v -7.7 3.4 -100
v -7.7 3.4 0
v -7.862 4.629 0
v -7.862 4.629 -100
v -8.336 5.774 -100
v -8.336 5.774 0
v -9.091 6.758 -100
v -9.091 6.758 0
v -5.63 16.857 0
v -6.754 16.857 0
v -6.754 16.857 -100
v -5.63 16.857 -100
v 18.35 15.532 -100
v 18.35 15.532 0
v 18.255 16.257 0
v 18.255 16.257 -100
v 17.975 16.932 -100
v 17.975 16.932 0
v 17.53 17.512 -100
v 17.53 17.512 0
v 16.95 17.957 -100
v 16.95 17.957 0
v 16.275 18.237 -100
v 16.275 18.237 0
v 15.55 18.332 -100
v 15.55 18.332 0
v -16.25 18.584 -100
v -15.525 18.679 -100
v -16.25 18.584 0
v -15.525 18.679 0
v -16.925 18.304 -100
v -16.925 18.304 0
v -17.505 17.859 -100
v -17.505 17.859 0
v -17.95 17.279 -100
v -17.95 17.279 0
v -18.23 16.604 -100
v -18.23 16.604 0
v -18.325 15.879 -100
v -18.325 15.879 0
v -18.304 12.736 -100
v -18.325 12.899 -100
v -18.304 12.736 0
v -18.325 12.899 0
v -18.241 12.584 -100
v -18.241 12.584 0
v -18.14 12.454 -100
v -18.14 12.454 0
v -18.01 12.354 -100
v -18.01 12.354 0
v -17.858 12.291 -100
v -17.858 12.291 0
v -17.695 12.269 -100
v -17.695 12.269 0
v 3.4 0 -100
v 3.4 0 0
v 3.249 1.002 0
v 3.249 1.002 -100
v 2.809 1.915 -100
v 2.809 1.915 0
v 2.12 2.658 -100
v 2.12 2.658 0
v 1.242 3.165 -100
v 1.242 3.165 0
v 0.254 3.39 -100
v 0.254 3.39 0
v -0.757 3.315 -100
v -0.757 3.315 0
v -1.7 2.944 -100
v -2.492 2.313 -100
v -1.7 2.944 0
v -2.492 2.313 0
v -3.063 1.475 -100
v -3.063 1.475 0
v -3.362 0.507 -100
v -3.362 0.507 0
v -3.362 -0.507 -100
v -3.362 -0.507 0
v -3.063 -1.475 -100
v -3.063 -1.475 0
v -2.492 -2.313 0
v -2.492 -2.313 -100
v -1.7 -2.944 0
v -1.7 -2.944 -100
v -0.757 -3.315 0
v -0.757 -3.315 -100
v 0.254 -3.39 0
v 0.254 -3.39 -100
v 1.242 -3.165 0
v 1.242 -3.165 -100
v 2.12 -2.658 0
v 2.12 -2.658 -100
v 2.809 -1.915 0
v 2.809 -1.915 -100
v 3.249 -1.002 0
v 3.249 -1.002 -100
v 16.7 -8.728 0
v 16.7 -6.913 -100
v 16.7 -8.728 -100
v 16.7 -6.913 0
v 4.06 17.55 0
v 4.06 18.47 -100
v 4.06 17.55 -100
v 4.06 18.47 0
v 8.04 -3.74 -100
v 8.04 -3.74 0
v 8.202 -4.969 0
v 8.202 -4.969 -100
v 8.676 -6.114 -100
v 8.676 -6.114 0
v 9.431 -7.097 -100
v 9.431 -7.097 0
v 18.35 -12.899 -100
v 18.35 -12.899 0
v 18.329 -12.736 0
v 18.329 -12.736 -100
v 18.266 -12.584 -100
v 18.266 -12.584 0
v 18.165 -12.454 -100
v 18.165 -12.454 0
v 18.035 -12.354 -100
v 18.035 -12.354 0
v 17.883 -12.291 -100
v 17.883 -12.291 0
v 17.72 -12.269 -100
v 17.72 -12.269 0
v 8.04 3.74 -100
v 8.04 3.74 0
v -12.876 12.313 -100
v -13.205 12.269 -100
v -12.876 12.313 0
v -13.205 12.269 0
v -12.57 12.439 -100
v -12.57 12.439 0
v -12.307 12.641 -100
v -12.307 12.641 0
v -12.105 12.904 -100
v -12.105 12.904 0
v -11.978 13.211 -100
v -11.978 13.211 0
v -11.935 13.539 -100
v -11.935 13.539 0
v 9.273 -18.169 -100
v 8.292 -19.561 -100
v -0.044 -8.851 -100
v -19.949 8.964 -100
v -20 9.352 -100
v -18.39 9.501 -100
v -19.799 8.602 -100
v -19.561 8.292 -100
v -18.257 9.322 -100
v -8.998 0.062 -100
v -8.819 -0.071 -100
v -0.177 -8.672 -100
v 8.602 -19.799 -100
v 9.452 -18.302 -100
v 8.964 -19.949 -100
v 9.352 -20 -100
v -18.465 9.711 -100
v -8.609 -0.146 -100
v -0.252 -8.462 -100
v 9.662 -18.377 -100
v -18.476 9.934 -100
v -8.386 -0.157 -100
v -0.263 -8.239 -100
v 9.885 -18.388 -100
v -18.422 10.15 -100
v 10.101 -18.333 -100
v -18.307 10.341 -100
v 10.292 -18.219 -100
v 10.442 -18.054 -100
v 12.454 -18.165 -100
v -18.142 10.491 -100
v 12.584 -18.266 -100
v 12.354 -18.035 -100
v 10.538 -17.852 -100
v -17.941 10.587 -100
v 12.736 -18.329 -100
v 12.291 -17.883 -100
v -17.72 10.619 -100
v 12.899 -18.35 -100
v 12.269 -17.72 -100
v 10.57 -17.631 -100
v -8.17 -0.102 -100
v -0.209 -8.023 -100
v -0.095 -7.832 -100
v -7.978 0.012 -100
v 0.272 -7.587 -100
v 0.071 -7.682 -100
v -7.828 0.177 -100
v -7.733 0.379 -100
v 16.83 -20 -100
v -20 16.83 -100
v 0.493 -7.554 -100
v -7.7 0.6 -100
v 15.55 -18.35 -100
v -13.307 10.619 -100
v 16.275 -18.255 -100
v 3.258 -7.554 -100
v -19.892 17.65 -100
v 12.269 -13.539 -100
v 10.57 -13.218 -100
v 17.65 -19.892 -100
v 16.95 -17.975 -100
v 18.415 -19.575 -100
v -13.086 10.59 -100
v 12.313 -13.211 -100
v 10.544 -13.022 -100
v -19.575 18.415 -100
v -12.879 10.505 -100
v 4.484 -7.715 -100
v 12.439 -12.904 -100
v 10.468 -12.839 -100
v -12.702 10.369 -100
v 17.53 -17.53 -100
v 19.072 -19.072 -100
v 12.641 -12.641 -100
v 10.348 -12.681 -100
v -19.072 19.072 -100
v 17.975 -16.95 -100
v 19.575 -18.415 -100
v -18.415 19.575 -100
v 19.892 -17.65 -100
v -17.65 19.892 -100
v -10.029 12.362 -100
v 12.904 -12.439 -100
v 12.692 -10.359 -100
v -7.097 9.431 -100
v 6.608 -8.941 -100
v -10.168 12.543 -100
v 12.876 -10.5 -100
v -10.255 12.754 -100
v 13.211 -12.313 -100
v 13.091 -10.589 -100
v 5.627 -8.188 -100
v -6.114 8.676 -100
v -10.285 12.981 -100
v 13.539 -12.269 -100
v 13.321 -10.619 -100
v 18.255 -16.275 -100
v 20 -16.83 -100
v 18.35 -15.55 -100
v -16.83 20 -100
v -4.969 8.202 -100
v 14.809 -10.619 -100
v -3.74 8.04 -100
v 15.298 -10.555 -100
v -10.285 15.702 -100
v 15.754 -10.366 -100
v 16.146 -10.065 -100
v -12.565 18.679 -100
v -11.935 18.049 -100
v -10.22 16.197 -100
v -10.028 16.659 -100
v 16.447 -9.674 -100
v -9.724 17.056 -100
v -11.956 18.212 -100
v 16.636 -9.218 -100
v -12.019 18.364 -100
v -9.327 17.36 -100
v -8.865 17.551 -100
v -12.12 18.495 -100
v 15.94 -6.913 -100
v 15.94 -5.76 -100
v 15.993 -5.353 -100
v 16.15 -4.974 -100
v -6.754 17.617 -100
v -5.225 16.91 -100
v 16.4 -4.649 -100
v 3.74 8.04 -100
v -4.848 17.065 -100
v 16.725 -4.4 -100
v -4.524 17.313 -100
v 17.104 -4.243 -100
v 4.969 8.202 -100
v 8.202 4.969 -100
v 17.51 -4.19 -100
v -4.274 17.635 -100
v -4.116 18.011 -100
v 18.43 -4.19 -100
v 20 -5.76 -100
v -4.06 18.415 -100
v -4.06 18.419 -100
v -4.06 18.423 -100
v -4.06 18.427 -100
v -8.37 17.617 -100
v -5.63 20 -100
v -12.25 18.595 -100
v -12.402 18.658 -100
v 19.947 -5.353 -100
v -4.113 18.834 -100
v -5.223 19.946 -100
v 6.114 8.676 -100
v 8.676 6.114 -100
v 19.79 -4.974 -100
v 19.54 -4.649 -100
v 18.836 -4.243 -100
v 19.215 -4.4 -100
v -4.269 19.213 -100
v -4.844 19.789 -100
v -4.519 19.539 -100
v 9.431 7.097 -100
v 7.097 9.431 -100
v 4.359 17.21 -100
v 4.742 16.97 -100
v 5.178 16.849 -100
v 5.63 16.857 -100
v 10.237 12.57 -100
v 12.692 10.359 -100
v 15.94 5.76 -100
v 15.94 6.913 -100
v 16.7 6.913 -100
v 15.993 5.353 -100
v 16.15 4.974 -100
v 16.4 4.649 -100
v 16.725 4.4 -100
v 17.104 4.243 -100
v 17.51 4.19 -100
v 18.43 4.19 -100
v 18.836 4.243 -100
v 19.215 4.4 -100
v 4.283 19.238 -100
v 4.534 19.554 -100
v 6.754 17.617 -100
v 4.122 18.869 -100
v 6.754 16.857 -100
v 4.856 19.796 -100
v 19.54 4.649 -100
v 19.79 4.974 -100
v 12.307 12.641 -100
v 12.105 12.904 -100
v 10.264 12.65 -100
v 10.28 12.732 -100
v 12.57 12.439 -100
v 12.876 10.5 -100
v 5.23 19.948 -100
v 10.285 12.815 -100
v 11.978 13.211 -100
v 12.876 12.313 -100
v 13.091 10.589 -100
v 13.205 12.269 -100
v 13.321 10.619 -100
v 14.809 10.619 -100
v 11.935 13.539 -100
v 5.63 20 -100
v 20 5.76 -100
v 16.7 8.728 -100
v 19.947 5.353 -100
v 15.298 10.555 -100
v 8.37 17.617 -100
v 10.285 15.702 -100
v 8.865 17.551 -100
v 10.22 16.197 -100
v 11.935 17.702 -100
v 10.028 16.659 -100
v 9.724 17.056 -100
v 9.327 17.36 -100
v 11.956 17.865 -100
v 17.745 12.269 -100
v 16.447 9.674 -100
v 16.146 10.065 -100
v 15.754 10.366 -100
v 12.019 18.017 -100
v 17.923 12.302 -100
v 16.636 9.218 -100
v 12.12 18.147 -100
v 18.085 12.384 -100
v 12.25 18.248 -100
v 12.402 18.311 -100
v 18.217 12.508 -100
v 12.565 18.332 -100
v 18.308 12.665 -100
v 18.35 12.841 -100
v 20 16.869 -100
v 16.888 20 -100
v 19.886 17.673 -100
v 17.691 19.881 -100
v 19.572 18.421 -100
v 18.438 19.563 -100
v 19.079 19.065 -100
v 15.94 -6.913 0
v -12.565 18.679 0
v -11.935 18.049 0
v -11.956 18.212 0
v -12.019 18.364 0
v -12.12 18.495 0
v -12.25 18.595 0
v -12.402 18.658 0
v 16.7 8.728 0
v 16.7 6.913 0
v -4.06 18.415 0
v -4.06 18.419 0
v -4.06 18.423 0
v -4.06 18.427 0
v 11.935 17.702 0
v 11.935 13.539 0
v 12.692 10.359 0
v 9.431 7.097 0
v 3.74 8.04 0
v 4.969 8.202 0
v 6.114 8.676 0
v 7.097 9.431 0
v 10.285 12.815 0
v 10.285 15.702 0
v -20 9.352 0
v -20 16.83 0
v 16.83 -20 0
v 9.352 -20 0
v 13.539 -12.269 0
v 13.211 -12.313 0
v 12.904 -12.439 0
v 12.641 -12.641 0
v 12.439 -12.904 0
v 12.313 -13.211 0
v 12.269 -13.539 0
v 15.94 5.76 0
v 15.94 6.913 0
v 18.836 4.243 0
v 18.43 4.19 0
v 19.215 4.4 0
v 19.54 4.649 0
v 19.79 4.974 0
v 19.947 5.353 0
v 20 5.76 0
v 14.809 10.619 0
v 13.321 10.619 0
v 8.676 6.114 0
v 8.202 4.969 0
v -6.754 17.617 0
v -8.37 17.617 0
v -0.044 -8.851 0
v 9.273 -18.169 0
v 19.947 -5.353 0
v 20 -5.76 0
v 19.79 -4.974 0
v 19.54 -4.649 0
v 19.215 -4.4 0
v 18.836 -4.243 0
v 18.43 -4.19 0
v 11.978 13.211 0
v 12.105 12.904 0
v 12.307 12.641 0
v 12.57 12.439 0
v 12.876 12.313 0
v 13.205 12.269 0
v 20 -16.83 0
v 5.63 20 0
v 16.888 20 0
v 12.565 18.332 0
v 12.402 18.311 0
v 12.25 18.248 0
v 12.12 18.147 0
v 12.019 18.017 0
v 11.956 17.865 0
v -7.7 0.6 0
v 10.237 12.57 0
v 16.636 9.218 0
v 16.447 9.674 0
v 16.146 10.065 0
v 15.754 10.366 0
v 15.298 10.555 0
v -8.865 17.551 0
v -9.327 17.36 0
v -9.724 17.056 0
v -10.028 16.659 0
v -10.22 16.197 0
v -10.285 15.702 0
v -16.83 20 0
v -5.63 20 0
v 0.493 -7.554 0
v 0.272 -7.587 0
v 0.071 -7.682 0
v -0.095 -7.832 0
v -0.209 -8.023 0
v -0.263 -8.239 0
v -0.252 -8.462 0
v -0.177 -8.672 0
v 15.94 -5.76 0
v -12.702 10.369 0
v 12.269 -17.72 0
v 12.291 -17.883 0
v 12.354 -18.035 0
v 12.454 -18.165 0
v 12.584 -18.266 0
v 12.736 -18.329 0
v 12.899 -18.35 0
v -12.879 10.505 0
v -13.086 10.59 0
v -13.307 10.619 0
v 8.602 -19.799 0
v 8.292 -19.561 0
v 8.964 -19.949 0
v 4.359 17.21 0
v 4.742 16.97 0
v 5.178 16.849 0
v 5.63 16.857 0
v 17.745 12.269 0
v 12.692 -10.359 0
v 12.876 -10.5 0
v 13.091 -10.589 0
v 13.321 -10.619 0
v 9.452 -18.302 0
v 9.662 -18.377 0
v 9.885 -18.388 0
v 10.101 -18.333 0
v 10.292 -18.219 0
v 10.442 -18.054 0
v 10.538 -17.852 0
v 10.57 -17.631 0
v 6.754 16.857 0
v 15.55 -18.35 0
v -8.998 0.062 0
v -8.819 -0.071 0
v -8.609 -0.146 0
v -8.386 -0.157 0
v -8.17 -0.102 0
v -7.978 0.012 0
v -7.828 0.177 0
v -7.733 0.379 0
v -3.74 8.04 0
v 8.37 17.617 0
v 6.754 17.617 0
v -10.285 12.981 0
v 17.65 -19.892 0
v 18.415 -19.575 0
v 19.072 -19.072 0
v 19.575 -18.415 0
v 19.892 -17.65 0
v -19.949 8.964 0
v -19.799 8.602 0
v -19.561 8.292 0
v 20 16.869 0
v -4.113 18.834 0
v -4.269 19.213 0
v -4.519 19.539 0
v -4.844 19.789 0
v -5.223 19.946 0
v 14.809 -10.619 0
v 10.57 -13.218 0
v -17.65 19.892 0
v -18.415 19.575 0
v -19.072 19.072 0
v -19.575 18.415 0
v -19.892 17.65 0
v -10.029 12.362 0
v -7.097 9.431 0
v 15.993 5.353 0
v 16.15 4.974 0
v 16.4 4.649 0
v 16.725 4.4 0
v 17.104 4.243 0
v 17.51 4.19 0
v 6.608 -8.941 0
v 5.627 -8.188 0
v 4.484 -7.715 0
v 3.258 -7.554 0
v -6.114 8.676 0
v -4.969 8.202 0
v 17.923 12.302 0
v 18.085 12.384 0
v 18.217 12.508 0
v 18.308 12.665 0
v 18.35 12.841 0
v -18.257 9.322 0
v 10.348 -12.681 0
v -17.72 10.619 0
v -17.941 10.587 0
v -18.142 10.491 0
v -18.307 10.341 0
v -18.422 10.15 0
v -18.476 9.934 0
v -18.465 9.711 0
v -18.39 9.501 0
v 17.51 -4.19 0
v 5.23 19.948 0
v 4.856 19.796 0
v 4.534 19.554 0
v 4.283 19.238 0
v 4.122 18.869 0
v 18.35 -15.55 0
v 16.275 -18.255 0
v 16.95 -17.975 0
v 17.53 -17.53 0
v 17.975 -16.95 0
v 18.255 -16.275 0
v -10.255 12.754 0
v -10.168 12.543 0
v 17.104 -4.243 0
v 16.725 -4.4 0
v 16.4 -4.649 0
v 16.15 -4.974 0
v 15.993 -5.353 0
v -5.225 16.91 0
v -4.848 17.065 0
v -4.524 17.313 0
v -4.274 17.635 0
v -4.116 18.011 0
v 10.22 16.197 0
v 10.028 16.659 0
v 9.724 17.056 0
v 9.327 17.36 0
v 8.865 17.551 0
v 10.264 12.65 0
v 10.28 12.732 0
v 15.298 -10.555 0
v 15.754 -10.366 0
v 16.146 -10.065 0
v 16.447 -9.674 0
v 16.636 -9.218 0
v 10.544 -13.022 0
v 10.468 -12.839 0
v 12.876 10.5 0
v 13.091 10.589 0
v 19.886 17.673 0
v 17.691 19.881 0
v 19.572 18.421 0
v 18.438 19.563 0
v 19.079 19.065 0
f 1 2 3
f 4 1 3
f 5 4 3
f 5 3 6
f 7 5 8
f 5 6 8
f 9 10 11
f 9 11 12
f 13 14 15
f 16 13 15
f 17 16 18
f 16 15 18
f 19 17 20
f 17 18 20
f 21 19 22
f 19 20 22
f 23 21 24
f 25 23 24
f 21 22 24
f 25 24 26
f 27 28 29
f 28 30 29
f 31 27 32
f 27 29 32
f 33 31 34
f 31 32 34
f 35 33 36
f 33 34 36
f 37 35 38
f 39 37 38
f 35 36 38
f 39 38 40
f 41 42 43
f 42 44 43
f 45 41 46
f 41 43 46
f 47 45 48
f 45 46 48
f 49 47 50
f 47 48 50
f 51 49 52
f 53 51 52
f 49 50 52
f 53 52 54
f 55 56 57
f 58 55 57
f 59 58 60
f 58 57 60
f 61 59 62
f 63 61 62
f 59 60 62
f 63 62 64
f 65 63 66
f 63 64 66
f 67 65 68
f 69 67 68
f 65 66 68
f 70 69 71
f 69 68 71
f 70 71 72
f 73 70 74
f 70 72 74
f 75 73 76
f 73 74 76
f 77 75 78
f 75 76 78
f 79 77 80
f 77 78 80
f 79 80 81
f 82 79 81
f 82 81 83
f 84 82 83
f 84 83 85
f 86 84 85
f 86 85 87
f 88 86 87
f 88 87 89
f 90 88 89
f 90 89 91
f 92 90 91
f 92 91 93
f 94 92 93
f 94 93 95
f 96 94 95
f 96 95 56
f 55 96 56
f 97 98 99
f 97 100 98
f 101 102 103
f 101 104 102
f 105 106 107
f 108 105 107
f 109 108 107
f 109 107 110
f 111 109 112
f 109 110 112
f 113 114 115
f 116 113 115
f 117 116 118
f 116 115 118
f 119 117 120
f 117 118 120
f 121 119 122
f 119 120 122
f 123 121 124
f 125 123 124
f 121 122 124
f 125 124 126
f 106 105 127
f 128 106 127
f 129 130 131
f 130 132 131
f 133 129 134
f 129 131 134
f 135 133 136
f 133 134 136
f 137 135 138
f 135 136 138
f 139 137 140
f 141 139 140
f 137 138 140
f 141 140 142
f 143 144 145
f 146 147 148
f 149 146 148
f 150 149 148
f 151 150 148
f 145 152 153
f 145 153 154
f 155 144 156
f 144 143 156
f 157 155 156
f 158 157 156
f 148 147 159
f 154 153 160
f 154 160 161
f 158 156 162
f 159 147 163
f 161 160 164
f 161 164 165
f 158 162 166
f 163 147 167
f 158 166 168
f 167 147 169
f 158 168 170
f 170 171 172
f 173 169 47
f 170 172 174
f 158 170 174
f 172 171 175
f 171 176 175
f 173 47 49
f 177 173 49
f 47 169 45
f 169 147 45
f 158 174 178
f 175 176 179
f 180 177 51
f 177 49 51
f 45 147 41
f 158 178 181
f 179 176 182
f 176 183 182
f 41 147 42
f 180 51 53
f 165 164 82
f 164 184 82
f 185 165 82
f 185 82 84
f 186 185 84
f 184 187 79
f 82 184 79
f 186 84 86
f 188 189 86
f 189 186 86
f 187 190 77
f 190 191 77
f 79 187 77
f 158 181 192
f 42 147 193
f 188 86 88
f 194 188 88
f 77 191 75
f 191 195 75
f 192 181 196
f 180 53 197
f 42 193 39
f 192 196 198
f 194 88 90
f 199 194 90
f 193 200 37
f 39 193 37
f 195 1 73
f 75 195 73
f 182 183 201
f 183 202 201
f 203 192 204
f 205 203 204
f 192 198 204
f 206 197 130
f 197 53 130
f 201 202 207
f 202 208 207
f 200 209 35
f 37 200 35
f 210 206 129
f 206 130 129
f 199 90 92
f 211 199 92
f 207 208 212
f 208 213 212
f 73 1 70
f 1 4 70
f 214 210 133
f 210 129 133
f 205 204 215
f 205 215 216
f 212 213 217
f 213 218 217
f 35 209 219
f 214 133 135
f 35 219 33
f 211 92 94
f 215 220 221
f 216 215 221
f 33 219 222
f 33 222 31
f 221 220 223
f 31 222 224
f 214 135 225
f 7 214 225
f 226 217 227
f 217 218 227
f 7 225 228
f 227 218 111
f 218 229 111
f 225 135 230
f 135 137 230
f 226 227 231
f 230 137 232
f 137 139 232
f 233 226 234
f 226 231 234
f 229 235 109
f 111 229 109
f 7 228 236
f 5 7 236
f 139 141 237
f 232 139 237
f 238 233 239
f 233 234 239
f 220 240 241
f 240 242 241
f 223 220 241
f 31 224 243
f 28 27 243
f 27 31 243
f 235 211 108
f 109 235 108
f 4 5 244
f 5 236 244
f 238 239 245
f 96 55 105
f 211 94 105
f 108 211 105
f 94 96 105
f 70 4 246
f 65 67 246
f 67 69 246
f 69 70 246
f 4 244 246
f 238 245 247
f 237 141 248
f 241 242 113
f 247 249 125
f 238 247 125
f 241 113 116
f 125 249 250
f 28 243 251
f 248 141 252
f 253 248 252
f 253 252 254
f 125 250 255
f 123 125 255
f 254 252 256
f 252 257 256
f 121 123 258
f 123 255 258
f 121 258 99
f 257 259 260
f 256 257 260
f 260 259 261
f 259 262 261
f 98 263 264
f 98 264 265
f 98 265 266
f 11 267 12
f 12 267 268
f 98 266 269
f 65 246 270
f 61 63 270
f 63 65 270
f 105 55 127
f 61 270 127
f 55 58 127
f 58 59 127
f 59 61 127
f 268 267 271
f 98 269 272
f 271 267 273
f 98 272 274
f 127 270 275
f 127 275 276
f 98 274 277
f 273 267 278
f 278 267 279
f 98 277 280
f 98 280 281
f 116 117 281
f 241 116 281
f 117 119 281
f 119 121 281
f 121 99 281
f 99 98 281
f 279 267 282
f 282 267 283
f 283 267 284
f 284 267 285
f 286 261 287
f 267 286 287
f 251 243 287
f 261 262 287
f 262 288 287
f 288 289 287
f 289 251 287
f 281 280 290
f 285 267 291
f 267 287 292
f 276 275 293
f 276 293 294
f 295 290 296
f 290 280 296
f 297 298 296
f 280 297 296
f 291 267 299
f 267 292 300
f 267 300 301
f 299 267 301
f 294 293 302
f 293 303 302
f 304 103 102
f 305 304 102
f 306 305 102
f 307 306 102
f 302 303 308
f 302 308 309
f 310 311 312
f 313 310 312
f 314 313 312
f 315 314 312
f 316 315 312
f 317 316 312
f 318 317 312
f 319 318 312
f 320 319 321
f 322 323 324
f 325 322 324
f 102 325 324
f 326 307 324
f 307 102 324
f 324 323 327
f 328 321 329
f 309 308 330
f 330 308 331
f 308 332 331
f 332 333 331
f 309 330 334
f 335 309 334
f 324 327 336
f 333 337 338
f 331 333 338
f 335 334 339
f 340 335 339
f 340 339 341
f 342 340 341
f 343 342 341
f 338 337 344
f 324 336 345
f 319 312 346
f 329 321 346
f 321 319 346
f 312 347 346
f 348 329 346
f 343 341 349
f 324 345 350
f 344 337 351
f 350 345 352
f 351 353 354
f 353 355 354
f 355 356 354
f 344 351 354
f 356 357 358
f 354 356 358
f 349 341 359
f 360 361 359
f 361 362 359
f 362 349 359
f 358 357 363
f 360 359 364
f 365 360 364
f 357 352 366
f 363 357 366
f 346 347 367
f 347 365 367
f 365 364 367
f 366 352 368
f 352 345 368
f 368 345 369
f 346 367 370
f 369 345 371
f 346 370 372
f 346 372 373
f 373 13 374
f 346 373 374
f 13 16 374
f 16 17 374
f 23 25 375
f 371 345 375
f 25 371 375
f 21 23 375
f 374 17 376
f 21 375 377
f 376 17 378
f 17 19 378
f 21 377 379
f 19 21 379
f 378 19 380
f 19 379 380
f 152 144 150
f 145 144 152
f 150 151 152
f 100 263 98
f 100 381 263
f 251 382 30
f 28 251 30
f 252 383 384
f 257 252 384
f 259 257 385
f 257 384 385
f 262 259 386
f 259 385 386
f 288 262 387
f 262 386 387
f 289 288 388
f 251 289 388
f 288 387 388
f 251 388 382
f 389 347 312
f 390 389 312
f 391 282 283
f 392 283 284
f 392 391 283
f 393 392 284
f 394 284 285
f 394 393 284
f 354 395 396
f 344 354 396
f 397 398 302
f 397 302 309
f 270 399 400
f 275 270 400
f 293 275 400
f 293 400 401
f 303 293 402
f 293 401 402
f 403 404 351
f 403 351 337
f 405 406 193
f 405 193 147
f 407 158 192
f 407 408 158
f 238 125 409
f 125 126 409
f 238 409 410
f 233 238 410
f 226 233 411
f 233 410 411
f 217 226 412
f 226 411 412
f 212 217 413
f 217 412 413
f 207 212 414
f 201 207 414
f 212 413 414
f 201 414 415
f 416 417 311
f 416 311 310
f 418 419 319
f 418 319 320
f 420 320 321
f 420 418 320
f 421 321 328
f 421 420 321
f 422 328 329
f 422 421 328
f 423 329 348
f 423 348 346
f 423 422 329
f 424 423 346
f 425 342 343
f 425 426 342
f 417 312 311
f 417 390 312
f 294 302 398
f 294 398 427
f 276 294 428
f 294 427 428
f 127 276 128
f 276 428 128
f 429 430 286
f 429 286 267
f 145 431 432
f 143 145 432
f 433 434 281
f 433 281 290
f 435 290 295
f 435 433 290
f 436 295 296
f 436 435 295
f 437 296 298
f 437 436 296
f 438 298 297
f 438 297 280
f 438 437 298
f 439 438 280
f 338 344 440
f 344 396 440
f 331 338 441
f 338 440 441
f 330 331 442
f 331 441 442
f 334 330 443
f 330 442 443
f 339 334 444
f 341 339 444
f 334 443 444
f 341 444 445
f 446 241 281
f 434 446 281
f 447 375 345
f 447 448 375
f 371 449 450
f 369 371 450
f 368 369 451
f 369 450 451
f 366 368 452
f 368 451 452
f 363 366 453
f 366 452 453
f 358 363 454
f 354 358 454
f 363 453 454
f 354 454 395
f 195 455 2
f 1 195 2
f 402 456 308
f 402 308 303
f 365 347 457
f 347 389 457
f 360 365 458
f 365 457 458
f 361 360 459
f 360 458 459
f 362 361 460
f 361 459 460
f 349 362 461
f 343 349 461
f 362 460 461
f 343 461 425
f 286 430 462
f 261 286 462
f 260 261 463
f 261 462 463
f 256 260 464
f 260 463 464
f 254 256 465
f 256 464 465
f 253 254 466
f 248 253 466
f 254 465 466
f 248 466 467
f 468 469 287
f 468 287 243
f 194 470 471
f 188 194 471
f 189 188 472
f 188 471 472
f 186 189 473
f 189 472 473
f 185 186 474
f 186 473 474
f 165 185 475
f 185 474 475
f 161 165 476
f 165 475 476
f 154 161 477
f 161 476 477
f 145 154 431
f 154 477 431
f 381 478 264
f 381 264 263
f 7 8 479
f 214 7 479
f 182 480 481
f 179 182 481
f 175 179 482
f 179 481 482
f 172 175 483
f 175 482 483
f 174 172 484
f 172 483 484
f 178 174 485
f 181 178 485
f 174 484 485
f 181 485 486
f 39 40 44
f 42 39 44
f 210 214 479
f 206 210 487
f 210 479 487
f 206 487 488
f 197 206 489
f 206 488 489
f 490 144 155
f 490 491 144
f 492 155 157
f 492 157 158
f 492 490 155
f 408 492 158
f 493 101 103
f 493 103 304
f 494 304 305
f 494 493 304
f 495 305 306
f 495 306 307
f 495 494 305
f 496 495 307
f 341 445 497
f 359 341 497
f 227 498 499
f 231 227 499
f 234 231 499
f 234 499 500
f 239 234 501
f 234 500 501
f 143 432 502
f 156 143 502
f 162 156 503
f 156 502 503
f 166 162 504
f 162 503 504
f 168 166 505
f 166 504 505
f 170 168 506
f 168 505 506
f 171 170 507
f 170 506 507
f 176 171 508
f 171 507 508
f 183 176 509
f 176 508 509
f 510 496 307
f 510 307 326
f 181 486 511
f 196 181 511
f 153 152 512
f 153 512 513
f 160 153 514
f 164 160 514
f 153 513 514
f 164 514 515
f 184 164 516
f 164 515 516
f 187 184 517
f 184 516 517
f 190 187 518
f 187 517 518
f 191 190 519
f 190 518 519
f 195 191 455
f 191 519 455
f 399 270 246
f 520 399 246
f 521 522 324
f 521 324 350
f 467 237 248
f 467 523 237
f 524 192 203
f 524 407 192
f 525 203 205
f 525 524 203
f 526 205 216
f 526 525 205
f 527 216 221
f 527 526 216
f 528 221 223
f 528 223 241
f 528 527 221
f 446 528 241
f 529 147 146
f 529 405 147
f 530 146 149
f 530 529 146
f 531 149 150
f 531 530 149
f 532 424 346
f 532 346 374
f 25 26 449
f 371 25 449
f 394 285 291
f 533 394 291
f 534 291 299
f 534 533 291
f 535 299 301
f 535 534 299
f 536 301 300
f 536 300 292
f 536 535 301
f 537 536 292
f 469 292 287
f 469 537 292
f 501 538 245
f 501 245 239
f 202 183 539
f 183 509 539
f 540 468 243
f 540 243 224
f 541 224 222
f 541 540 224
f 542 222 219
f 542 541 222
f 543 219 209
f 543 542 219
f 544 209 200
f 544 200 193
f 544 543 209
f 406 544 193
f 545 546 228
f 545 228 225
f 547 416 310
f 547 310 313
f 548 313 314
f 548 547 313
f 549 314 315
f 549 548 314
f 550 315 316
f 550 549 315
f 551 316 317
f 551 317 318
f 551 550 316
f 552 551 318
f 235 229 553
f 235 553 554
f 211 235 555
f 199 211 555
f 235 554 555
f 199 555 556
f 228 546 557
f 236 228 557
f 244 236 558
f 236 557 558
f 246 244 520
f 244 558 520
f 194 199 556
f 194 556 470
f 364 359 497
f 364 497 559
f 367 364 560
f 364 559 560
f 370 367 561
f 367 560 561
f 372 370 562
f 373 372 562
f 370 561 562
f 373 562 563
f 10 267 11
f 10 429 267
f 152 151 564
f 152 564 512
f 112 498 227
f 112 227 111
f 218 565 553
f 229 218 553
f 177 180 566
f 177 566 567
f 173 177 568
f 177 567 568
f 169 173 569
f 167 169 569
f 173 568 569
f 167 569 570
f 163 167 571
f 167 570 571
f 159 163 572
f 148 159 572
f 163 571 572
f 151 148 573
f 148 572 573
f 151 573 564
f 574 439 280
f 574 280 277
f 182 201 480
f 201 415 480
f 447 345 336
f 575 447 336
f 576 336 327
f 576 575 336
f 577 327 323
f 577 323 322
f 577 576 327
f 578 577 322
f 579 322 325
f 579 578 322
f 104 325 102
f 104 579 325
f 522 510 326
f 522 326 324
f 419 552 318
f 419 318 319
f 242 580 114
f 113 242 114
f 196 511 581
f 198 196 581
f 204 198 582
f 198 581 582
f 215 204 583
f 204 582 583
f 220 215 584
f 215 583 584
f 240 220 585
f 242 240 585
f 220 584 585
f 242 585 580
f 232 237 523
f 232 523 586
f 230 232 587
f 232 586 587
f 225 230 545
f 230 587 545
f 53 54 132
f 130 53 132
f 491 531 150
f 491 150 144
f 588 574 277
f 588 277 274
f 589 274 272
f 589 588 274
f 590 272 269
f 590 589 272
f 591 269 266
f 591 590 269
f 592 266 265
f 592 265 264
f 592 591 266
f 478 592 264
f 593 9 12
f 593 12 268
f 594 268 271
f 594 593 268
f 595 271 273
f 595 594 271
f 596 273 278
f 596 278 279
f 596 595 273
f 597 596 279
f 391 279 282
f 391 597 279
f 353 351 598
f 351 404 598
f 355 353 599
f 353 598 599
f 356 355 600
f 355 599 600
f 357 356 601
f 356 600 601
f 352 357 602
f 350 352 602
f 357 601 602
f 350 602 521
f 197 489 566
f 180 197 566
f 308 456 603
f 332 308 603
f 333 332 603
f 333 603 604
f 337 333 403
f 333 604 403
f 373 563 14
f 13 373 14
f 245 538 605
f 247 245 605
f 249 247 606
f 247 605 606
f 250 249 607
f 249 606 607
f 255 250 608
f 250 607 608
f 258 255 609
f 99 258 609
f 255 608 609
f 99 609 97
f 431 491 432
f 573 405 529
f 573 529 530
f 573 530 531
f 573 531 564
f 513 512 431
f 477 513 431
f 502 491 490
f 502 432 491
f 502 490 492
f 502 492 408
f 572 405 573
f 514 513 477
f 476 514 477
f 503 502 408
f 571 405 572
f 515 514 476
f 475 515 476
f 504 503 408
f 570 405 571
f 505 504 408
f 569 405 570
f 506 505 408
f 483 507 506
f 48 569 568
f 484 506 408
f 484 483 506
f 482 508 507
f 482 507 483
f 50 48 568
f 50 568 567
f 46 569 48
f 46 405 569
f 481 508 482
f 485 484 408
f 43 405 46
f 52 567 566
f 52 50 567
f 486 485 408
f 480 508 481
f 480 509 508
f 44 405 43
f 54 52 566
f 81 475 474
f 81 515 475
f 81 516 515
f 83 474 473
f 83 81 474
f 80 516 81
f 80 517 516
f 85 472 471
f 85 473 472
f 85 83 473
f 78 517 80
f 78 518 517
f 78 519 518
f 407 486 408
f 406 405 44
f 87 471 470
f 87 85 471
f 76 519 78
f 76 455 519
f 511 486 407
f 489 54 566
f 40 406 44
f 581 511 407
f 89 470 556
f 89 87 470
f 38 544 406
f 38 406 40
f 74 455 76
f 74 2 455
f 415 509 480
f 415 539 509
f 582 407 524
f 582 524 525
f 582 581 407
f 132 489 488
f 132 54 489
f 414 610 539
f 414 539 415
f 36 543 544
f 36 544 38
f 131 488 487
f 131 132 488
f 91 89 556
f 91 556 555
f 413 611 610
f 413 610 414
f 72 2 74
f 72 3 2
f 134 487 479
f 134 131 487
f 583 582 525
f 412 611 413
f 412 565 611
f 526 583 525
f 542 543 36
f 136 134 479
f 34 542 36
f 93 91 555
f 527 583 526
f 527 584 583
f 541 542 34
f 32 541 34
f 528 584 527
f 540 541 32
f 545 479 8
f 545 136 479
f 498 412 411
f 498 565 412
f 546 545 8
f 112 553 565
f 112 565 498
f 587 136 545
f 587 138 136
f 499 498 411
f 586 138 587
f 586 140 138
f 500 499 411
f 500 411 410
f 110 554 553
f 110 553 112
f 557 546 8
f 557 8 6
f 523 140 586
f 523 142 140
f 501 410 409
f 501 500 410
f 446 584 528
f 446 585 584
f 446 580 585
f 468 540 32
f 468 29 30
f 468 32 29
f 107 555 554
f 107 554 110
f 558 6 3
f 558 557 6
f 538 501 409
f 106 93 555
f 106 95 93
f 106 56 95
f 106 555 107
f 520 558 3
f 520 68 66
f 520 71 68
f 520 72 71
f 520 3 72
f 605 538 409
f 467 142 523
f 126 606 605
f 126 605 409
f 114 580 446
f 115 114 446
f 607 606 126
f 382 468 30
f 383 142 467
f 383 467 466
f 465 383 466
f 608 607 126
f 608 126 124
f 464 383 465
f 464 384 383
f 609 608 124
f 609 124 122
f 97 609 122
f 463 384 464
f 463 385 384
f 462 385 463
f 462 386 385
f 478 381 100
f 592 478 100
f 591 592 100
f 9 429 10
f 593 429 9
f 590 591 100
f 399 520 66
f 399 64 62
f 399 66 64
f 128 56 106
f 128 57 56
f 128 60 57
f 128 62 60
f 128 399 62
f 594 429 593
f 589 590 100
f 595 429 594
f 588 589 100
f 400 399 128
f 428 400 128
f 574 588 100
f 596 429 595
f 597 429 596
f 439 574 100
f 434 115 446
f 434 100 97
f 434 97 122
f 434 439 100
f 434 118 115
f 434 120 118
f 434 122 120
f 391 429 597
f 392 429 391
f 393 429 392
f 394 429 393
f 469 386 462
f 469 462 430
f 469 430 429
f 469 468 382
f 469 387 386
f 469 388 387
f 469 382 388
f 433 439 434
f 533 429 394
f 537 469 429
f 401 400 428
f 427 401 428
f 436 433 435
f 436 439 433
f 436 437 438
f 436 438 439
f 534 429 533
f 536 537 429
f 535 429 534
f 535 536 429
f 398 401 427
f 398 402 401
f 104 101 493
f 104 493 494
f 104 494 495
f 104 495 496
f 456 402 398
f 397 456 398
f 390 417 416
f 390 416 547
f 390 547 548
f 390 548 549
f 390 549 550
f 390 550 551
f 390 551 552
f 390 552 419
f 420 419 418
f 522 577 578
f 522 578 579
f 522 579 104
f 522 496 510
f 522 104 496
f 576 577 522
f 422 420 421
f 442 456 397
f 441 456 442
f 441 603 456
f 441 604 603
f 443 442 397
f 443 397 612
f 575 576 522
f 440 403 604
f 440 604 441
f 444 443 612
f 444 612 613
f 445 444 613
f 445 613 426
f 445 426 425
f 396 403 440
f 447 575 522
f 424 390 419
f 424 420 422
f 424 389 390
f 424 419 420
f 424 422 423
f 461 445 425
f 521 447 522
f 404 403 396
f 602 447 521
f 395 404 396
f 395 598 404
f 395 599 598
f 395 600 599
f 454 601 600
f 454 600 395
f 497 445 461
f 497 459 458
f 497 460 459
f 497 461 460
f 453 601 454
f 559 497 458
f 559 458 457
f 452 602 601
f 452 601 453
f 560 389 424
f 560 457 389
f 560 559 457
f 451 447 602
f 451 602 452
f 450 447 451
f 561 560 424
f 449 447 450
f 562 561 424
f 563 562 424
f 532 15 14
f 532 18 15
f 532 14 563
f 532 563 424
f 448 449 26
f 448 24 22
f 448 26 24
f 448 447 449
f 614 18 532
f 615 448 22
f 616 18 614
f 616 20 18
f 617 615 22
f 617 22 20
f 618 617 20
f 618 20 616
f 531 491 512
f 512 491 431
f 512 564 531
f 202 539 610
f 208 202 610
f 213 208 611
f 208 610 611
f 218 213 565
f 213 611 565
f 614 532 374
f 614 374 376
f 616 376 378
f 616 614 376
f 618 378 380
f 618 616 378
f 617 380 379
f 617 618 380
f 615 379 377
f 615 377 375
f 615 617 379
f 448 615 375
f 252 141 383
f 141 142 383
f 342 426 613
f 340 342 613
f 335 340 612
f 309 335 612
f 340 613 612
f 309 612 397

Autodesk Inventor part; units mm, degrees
ref_plane "YZ Plane" through (0, 0, 0) normal (1, 0, 0) x (0, 1, 0)
ref_plane "XZ Plane" through (0, 0, 0) normal (0, 1, 0) x (-1, 0, 0)
ref_plane "XY Plane" through (0, 0, 0) normal (0, 0, 1) x (1, 0, 0)
sketch "Sketch1" plane through (0, 0, 0) normal (0, 0, 1) x (1, 0, 0)
  circle A0 centre (0, 0) radius 3.4
  arc A1 (-13.205, 12.2693) -> (-11.935, 13.5393) centre (-13.205, 13.5393) ccw
  line L0 (-17.695, 12.2693) -> (-13.205, 12.2693)
  arc A2 (-18.325, 12.8993) -> (-17.695, 12.2693) centre (-17.695, 12.8993) ccw
  line L1 (-18.325, 15.8793) -> (-18.325, 12.8993)
  arc A3 (-15.525, 18.6793) -> (-18.325, 15.8793) centre (-15.525, 15.8793) ccw
  line L2 (-12.565, 18.6793) -> (-15.525, 18.6793)
  arc A4 (-11.935, 18.0493) -> (-12.565, 18.6793) centre (-12.565, 18.0493) ccw
  line L3 (-11.935, 13.5393) -> (-11.935, 18.0493)
  arc A5 (-7.7004, 3.4003) -> (-9.0909, 6.7575) centre (-12.4481, 3.4003) ccw
  line L4 (-7.7004, 0.5997) -> (-7.7004, 3.4003)
  arc A6 (-8.9978, 0.0623) -> (-7.7004, 0.5997) centre (-8.4604, 0.5997) ccw
  line L5 (-18.2574, 9.3219) -> (-8.9978, 0.0623)
  arc A7 (-17.72, 10.6193) -> (-18.2574, 9.3219) centre (-17.72, 9.8593) ccw
  line L6 (-13.3072, 10.6193) -> (-17.72, 10.6193)
  arc A8 (-12.7021, 10.3687) -> (-13.3072, 10.6193) centre (-13.3072, 9.7636) ccw
  line L7 (-9.0909, 6.7575) -> (-12.7021, 10.3687)
  arc A9 (10.5703, -13.2185) -> (10.3477, -12.6811) centre (9.8103, -13.2185) ccw
  line L8 (10.5703, -17.6313) -> (10.5703, -13.2185)
  arc A10 (9.2729, -18.1687) -> (10.5703, -17.6313) centre (9.8103, -17.6313) ccw
  line L9 (-0.0445, -8.8513) -> (9.2729, -18.1687)
  arc A11 (0.4929, -7.5539) -> (-0.0445, -8.8513) centre (0.4929, -8.3139) ccw
  line L10 (3.2583, -7.5539) -> (0.4929, -7.5539)
  arc A12 (6.6079, -8.9413) -> (3.2583, -7.5539) centre (3.2583, -12.2908) ccw
  line L11 (10.3477, -12.6811) -> (6.6079, -8.9413)
  arc A13 (12.2693, -17.72) -> (12.8993, -18.35) centre (12.8993, -17.72) ccw
  line L12 (12.2693, -13.5393) -> (12.2693, -17.72)
  arc A14 (13.5393, -12.2693) -> (12.2693, -13.5393) centre (13.5393, -13.5393) ccw
  line L13 (17.72, -12.2693) -> (13.5393, -12.2693)
  arc A15 (18.35, -12.8993) -> (17.72, -12.2693) centre (17.72, -12.8993) ccw
  line L14 (18.35, -15.55) -> (18.35, -12.8993)
  arc A16 (15.55, -18.35) -> (18.35, -15.55) centre (15.55, -15.55) ccw
  line L15 (12.8993, -18.35) -> (15.55, -18.35)
  arc A17 (12.565, 18.332) -> (11.935, 17.702) centre (12.565, 17.702) ccw
  line L16 (15.55, 18.332) -> (12.565, 18.332)
  arc A18 (18.35, 15.532) -> (15.55, 18.332) centre (15.55, 15.532) ccw
  line L17 (18.35, 12.8413) -> (18.35, 15.532)
  arc A19 (17.745, 12.2693) -> (18.35, 12.8413) centre (17.7226, 12.8989) ccw
  line L18 (13.205, 12.2693) -> (17.745, 12.2693)
  arc A20 (11.935, 13.5393) -> (13.205, 12.2693) centre (13.205, 13.5393) ccw
  line L19 (11.935, 17.702) -> (11.935, 13.5393)
  arc A21 (8.04, -3.74) -> (9.4306, -7.0971) centre (12.7878, -3.74) ccw
  line L20 (8.04, -3.74) -> (8.04, 3.74)
  arc A22 (9.4306, 7.0971) -> (8.04, 3.74) centre (12.7878, 3.74) ccw
  line L21 (9.4306, 7.0971) -> (12.6921, 10.3586)
  arc A23 (13.3214, 10.6193) -> (12.6921, 10.3586) centre (13.3214, 9.7293) ccw
  line L22 (13.3214, 10.6193) -> (14.8088, 10.6193)
  arc A24 (16.7, 8.7281) -> (14.8088, 10.6193) centre (14.8088, 8.7281) ccw
  line L23 (16.7, 8.7281) -> (16.7, 6.9134)
  line L24 (16.7, 6.9134) -> (15.94, 6.9134)
  line L25 (15.94, 6.9134) -> (15.94, 5.7595)
  arc A25 (15.94, 5.7595) -> (17.51, 4.1895) centre (17.51, 5.7595) ccw
  line L26 (17.51, 4.1895) -> (18.43, 4.1895)
  arc A26 (18.43, 4.1895) -> (20, 5.7595) centre (18.43, 5.7595) ccw
  line L27 (20, 5.7595) -> (20, 16.8689)
  arc A27 (20, 16.8689) -> (16.8881, 20) centre (16.8302, 16.8305) ccw
  line L28 (16.8881, 20) -> (5.6295, 20)
  arc A28 (5.6295, 20) -> (4.06, 18.4701) centre (5.6295, 18.43) ccw
  line L29 (4.06, 18.4701) -> (4.06, 17.5501)
  arc A29 (4.06, 17.5501) -> (5.63, 16.8567) centre (5.3762, 18.406) ccw
  line L30 (5.63, 16.8567) -> (6.7535, 16.8567)
  line L31 (6.7535, 16.8567) -> (6.7535, 17.6167)
  line L32 (6.7535, 17.6167) -> (8.3698, 17.6167)
  arc A30 (10.285, 15.7015) -> (8.3698, 17.6167) centre (8.3698, 15.7015) ccw
  line L33 (10.285, 15.7015) -> (10.285, 12.8154)
  arc A31 (10.2371, 12.5705) -> (10.285, 12.8154) centre (9.6352, 12.8154) ccw
  line L34 (10.2371, 12.5705) -> (7.0971, 9.4306)
  arc A32 (3.74, 8.04) -> (7.0971, 9.4306) centre (3.74, 12.7878) ccw
  line L35 (3.74, 8.04) -> (-3.74, 8.04)
  arc A33 (-7.0971, 9.4306) -> (-3.74, 8.04) centre (-3.74, 12.7878) ccw
  line L36 (-7.0971, 9.4306) -> (-10.0289, 12.3623)
  arc A34 (-10.285, 12.9807) -> (-10.0289, 12.3623) centre (-9.4106, 12.9807) ccw
  line L37 (-10.285, 12.9807) -> (-10.285, 15.7015)
  arc A35 (-8.3698, 17.6167) -> (-10.285, 15.7015) centre (-8.3698, 15.7015) ccw
  line L38 (-8.3698, 17.6167) -> (-6.7535, 17.6167)
  line L39 (-6.7535, 17.6167) -> (-6.7535, 16.8567)
  line L40 (-6.7535, 16.8567) -> (-5.63, 16.8567)
  arc A36 (-5.63, 16.8567) -> (-4.06, 18.4267) centre (-5.63, 18.4267) ccw
  line L41 (-4.06, 18.4267) -> (-4.06, 18.4153)
  arc A37 (-4.06, 18.4153) -> (-5.6299, 20) centre (-5.6299, 18.43) ccw
  line L42 (-5.6299, 20) -> (-16.83, 20)
  arc A38 (-16.83, 20) -> (-20, 16.83) centre (-16.83, 16.83) ccw
  line L43 (-20, 16.83) -> (-20, 9.3524)
  arc A39 (-20, 9.3524) -> (-19.5607, 8.2917) centre (-18.5, 9.3524) ccw
  line L44 (-19.5607, 8.2917) -> (8.2917, -19.5607)
  arc A40 (8.2917, -19.5607) -> (9.3524, -20) centre (9.3524, -18.5) ccw
  line L45 (9.3524, -20) -> (16.83, -20)
  arc A41 (16.83, -20) -> (20, -16.83) centre (16.83, -16.83) ccw
  line L46 (20, -16.83) -> (20, -5.7595)
  arc A42 (20, -5.7595) -> (18.43, -4.1895) centre (18.43, -5.7595) ccw
  line L47 (18.43, -4.1895) -> (17.51, -4.1895)
  arc A43 (17.51, -4.1895) -> (15.94, -5.7595) centre (17.51, -5.7595) ccw
  line L48 (15.94, -5.7595) -> (15.94, -6.9134)
  line L49 (15.94, -6.9134) -> (16.7, -6.9134)
  line L50 (16.7, -6.9134) -> (16.7, -8.7281)
  arc A44 (14.8088, -10.6193) -> (16.7, -8.7281) centre (14.8088, -8.7281) ccw
  line L51 (14.8088, -10.6193) -> (13.3214, -10.6193)
  arc A45 (12.6921, -10.3586) -> (13.3214, -10.6193) centre (13.3214, -9.7293) ccw
  line L52 (12.6921, -10.3586) -> (9.4306, -7.0971)
extrude "Extrusion1" add sketch "Sketch1" against normal blind 100
properties part number "40-4045-LITE-BLACK-FB"
